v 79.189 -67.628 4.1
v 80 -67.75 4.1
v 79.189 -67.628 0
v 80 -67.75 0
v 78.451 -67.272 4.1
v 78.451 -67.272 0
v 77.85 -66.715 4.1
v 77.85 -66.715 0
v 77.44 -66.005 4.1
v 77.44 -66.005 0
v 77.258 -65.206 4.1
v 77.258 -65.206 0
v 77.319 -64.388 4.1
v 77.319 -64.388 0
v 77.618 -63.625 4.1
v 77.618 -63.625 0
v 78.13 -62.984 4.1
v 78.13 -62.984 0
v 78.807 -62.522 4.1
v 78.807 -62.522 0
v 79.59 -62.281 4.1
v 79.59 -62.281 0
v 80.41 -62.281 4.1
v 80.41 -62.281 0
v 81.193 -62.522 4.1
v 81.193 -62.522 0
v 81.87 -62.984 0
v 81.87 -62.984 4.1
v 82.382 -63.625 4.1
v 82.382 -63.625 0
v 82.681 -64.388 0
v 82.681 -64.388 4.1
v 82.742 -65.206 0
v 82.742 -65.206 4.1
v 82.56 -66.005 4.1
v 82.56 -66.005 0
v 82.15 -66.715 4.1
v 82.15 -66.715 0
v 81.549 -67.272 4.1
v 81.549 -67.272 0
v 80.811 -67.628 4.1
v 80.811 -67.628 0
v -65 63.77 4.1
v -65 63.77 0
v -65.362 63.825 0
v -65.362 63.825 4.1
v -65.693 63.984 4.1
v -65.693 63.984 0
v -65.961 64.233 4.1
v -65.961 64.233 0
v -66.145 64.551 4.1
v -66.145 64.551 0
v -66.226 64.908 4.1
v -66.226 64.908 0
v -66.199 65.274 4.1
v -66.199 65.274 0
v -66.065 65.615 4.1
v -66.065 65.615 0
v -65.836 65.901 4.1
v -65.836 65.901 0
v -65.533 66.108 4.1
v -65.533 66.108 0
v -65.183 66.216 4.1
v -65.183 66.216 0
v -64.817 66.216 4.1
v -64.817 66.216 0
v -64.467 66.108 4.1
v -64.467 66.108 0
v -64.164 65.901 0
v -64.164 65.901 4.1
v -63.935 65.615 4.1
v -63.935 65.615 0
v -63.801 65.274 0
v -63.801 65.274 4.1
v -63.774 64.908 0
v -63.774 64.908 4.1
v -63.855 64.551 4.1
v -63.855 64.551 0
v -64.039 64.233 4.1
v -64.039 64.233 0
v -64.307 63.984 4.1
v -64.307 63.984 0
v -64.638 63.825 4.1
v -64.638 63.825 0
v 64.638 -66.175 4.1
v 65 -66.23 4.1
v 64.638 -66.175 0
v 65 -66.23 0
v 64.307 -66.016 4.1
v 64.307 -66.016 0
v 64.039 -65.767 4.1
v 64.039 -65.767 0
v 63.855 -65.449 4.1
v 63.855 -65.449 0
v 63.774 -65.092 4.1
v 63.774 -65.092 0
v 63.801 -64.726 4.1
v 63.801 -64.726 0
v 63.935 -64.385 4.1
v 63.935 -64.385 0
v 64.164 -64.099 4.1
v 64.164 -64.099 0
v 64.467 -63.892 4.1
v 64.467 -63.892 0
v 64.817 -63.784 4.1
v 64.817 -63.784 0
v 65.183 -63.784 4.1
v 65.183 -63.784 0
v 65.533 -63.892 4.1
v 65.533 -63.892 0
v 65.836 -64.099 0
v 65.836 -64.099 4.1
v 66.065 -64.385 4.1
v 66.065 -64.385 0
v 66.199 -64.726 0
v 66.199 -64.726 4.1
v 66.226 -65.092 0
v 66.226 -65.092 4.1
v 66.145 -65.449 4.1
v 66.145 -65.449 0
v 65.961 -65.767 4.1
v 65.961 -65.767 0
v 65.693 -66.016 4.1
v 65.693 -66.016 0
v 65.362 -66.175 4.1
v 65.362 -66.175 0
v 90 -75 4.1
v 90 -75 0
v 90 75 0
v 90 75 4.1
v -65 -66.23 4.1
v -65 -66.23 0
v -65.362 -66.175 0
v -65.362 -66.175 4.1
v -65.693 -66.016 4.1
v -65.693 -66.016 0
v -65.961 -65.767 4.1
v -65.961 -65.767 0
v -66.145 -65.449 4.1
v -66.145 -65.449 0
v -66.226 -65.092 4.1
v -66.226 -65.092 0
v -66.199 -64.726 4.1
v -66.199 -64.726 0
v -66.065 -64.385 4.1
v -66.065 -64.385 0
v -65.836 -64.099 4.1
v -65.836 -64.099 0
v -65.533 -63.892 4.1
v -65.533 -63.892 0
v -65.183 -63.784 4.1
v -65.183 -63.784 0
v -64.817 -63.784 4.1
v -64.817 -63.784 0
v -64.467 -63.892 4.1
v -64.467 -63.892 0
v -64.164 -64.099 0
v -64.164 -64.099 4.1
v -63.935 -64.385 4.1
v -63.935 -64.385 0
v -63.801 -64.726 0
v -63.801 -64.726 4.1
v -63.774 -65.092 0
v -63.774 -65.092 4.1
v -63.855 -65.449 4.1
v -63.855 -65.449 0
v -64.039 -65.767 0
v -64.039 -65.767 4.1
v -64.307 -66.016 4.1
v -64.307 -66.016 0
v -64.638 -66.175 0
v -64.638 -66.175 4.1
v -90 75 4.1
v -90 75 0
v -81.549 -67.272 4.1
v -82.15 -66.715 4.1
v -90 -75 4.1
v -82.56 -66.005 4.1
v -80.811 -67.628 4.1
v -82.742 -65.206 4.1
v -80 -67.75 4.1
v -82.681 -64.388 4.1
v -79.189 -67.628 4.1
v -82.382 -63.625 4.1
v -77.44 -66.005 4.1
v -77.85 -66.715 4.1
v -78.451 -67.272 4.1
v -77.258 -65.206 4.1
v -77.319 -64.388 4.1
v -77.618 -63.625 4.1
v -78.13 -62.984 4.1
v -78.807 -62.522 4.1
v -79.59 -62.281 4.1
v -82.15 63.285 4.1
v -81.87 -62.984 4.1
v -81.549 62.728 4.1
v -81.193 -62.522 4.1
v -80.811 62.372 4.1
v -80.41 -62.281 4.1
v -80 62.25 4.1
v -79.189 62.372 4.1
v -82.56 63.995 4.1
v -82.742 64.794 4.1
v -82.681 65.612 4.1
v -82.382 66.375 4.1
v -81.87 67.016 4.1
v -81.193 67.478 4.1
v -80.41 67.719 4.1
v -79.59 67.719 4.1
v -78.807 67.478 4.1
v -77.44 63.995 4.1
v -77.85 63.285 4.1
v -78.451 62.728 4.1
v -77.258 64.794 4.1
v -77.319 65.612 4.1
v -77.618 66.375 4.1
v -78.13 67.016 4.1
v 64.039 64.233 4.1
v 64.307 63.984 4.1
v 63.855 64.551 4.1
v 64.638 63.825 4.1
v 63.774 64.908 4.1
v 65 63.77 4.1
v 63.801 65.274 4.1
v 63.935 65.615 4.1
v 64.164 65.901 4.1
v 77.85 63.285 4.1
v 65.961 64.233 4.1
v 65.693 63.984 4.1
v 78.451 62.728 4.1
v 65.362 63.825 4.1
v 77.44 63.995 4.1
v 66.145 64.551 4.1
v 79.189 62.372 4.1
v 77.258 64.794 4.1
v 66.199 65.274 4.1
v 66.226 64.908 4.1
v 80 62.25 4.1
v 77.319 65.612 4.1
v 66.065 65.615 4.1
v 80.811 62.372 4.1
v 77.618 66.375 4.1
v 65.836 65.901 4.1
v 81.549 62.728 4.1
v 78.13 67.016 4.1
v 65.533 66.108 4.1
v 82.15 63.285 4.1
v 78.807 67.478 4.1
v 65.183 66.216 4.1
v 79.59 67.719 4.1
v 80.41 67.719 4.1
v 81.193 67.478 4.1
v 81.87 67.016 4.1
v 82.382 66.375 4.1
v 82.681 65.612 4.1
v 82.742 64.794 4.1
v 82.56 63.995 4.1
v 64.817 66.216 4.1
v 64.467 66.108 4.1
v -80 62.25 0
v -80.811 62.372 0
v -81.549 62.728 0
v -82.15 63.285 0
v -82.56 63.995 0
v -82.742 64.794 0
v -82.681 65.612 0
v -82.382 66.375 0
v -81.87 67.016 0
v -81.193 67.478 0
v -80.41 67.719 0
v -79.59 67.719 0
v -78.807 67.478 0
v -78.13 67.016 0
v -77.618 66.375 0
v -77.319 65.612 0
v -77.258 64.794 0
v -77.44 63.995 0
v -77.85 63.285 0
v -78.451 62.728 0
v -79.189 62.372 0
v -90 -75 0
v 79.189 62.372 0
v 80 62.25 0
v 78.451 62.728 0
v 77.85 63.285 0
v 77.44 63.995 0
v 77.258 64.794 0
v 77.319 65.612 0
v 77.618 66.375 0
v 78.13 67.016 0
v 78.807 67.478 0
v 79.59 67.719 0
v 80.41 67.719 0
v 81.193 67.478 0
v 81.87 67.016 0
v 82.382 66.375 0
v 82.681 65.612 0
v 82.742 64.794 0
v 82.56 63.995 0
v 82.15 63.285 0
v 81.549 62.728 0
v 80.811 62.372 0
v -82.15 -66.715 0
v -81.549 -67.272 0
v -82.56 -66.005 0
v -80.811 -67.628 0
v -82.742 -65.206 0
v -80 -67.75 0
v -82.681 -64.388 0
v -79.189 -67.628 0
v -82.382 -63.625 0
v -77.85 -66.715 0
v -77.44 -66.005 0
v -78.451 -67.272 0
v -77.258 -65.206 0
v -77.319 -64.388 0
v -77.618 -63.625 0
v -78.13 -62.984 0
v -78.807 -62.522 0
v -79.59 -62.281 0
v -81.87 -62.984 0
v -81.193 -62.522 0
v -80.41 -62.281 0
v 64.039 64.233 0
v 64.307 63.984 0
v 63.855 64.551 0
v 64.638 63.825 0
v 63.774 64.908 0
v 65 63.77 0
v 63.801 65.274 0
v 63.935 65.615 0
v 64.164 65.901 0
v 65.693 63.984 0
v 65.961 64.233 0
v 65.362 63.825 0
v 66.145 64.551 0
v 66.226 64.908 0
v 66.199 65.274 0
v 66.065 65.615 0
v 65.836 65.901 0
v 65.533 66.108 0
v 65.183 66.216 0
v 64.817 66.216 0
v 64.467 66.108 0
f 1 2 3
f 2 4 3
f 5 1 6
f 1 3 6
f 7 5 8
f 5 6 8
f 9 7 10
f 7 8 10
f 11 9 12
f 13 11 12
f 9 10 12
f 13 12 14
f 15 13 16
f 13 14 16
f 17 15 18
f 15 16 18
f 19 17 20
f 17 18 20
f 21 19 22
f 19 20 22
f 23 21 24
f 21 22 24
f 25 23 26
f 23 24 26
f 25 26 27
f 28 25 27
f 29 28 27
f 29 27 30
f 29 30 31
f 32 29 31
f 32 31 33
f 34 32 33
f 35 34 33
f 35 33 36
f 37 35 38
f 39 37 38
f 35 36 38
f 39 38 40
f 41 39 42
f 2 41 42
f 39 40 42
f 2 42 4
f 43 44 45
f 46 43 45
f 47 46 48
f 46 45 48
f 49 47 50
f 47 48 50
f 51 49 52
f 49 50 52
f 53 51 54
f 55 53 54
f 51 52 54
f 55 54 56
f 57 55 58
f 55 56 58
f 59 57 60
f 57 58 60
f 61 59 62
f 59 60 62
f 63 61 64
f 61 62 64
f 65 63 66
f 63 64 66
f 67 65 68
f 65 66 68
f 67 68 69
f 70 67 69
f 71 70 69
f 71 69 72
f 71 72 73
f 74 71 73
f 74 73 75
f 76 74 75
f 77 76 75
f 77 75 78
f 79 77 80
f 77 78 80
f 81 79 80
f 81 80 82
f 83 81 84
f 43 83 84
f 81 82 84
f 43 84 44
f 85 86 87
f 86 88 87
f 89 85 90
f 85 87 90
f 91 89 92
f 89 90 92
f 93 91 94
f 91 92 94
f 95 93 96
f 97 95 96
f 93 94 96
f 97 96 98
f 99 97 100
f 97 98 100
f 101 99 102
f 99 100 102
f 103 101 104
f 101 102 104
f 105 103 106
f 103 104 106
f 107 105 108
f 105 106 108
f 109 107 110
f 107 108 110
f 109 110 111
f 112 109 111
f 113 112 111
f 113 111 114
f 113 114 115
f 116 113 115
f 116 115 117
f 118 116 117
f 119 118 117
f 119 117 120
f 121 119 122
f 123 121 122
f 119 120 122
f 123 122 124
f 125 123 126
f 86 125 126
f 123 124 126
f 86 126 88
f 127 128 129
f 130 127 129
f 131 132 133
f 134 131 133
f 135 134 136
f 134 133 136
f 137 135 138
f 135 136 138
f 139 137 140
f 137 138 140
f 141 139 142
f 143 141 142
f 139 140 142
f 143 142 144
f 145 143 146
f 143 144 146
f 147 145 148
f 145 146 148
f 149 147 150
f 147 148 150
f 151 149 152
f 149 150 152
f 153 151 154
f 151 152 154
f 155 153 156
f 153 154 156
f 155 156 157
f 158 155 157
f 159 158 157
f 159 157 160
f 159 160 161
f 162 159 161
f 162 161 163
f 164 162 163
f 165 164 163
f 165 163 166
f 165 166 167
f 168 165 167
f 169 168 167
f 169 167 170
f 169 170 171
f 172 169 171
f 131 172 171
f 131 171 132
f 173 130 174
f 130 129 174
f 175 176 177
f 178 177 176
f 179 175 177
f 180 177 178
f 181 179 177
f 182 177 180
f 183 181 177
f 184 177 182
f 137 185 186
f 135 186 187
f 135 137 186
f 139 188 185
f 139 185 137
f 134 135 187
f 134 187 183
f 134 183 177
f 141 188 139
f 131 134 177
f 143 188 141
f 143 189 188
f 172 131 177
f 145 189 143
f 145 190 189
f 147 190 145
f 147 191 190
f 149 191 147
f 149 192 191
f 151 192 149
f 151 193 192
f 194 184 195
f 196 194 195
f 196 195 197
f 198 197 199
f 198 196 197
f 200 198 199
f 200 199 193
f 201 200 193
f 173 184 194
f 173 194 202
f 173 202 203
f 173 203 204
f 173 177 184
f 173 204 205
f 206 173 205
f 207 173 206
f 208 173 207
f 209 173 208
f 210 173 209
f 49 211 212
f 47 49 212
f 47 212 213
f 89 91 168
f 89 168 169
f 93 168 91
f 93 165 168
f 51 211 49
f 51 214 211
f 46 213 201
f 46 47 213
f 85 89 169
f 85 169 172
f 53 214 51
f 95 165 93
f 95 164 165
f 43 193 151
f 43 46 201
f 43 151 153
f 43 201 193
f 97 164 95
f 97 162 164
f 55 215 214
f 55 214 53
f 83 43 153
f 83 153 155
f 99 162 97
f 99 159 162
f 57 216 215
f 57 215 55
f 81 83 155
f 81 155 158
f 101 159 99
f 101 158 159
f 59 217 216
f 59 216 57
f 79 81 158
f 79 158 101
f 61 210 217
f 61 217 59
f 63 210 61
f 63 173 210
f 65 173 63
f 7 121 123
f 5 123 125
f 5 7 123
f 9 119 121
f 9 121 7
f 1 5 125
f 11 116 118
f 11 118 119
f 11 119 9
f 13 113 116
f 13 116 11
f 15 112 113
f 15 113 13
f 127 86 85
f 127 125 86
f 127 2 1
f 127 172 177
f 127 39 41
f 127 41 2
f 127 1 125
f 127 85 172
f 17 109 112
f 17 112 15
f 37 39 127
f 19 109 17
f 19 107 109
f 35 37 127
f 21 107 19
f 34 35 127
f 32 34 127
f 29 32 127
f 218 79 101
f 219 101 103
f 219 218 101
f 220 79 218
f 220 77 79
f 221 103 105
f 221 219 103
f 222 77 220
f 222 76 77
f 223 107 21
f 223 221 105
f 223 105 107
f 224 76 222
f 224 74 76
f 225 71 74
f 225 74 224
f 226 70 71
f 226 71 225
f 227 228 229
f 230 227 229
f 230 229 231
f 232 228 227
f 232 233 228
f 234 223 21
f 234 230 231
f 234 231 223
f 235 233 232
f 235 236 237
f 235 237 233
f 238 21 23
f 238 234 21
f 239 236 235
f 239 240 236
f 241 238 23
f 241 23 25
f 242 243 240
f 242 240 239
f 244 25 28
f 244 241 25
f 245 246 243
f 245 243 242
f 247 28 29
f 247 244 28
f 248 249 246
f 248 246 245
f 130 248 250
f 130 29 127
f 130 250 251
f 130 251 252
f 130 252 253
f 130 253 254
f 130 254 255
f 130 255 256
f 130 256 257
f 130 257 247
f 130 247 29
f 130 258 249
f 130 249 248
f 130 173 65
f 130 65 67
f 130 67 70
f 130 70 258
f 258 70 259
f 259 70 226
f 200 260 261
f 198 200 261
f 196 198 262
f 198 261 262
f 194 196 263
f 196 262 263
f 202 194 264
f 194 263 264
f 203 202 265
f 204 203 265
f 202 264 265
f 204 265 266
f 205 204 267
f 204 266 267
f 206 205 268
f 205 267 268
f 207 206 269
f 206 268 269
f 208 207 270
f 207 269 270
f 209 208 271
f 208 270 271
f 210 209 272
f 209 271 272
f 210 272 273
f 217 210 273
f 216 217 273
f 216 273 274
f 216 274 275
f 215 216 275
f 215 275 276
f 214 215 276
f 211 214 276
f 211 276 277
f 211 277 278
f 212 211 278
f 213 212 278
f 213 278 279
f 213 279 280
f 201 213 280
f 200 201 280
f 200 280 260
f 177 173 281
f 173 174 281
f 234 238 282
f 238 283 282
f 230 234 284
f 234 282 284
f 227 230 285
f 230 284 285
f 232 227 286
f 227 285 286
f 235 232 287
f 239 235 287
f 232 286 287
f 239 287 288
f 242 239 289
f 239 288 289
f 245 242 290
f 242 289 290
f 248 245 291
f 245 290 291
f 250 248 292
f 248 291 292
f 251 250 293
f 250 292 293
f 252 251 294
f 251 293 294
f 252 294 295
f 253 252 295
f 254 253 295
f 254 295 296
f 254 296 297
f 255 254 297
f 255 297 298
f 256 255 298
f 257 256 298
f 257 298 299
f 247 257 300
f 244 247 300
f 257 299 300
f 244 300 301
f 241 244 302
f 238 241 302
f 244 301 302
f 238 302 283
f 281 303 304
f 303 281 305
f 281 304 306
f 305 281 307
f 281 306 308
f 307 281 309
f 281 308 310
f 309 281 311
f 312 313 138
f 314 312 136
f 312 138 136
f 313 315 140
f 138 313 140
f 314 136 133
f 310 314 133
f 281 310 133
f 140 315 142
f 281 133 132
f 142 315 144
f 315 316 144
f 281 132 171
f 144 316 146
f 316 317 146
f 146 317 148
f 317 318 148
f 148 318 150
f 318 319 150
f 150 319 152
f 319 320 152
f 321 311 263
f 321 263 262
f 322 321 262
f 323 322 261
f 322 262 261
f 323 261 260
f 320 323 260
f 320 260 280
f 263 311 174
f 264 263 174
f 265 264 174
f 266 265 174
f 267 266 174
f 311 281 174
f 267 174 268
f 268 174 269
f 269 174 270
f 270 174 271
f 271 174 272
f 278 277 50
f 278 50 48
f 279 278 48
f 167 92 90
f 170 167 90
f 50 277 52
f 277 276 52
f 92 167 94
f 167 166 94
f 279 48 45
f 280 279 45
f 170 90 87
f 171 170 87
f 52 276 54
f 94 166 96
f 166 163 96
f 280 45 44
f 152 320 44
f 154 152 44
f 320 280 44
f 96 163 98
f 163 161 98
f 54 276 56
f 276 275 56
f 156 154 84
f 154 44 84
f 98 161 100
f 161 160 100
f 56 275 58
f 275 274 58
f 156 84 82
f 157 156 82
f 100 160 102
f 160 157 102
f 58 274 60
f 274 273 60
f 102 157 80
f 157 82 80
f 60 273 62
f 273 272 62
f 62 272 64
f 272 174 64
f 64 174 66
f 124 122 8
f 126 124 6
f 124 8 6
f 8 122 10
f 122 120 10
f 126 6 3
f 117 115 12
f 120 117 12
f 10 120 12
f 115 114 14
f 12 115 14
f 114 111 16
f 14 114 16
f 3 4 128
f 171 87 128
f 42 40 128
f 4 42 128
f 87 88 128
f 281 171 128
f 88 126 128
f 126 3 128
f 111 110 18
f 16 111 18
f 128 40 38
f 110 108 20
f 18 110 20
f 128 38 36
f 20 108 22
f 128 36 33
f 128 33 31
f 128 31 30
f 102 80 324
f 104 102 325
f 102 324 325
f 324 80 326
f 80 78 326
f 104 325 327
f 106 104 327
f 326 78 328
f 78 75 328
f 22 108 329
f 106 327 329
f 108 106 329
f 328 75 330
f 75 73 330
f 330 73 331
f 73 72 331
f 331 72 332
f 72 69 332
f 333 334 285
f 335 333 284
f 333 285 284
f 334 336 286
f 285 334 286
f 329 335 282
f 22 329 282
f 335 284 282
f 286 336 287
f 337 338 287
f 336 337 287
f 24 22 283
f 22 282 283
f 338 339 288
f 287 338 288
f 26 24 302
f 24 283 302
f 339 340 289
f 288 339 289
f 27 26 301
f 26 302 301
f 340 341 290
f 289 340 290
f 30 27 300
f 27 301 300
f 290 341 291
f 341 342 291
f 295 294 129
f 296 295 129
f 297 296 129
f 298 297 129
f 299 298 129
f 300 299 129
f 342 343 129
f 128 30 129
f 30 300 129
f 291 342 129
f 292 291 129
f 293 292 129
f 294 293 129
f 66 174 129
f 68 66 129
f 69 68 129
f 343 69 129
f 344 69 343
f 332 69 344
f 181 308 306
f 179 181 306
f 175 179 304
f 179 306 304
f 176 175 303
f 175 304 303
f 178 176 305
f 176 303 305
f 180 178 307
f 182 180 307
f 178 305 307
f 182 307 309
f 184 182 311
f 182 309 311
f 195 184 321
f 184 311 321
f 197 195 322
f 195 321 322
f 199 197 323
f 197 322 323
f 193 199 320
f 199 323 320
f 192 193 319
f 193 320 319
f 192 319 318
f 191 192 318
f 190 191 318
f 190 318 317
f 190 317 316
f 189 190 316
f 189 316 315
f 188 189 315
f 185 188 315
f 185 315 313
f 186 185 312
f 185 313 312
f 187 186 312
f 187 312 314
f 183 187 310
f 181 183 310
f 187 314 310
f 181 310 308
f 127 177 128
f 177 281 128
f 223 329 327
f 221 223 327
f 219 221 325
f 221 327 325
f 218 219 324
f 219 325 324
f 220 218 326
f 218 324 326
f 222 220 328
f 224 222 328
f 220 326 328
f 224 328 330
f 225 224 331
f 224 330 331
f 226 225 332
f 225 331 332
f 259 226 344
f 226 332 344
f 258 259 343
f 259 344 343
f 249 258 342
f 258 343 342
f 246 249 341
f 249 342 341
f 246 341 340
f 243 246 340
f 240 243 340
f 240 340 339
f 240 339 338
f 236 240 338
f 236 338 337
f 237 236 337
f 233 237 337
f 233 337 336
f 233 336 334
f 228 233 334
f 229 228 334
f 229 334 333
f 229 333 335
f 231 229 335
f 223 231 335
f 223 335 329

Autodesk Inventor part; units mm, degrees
ref_plane "YZ Plane" through (0, 0, 0) normal (1, 0, 0) x (0, 1, 0)
ref_plane "XZ Plane" through (0, 0, 0) normal (0, 1, 0) x (-1, 0, 0)
ref_plane "XY Plane" through (0, 0, 0) normal (0, 0, 1) x (1, 0, 0)
sketch "Sketch1" plane through (0, 0, 0) normal (0, 0, 1) x (1, 0, 0)
  line L0 (-90, -75) -> (90, -75)
  line L1 (90, -75) -> (90, 75)
  line L2 (90, 75) -> (-90, 75)
  line L3 (-90, 75) -> (-90, -75)
  line L4 (-90, -75) -> (90, 75) construction
  line L5 (90, -75) -> (-90, 75) construction
  point P0 (0, 0)
  dimension "d0" = 180
  dimension "d1" = 150
extrude "Extrusion1" add sketch "Sketch1" along normal blind 4.1
sketch "Sketch2" plane through (0, 0, 4.1) normal (0, 0, 1) x (1, 0, 0)
  line L0 (90, 75) -> (-90, 75) projected
  line L1 (-90, 75) -> (-90, -75) projected
  line L2 (-90, -75) -> (90, -75) projected
  line L3 (90, -75) -> (90, 75) projected
  point P0 (0, 0)
  point P1 (-80, 65)
  point P2 (80, 65)
  point P3 (80, -65)
  point P4 (-80, -65)
  dimension "d4" = 10
  dimension "d5" = 10
  dimension "d6" = 10
  dimension "d7" = 10
hole "Hole1" at (-80, 65, 4.1) at (80, 65, 4.1) at (80, -65, 4.1) at (-80, -65, 4.1) direction (0, 0, -1) diameter 5.5 depth 9.1 tip angle 118 clearance for "Flat Head Machine Screw" size "M5" standard "Ansi Metric M Profile"
sketch "Sketch3" plane through (0, 0, 4.1) normal (0, 0, 1) x (1, 0, 0)
  circle A0 centre (-80, 65) radius 2.75 projected
  circle A1 centre (80, 65) radius 2.75 projected
  circle A2 centre (-80, -65) radius 2.75 projected
  point P0 (0, 0)
  point P1 (-65, 65)
  point P2 (65, 65)
  point P3 (65, -65)
  point P4 (-65, -65)
  dimension "d15" = 15
  dimension "d16" = 15
hole "Hole2" at (-65, 65, 4.1) at (65, 65, 4.1) at (65, -65, 4.1) at (-65, -65, 4.1) direction (0, 0, -1) diameter 2.459 depth 8.8 tip angle 118 thread size "M3x0.5" class "6H" standard "ANSI Metric M Profile"
equation "\"d5\" = d4"
equation "\"d6\" = d4"
equation "\"d7\" = d4"
equation "\"d16\" = d15"
properties part number "MTLV-M02"
